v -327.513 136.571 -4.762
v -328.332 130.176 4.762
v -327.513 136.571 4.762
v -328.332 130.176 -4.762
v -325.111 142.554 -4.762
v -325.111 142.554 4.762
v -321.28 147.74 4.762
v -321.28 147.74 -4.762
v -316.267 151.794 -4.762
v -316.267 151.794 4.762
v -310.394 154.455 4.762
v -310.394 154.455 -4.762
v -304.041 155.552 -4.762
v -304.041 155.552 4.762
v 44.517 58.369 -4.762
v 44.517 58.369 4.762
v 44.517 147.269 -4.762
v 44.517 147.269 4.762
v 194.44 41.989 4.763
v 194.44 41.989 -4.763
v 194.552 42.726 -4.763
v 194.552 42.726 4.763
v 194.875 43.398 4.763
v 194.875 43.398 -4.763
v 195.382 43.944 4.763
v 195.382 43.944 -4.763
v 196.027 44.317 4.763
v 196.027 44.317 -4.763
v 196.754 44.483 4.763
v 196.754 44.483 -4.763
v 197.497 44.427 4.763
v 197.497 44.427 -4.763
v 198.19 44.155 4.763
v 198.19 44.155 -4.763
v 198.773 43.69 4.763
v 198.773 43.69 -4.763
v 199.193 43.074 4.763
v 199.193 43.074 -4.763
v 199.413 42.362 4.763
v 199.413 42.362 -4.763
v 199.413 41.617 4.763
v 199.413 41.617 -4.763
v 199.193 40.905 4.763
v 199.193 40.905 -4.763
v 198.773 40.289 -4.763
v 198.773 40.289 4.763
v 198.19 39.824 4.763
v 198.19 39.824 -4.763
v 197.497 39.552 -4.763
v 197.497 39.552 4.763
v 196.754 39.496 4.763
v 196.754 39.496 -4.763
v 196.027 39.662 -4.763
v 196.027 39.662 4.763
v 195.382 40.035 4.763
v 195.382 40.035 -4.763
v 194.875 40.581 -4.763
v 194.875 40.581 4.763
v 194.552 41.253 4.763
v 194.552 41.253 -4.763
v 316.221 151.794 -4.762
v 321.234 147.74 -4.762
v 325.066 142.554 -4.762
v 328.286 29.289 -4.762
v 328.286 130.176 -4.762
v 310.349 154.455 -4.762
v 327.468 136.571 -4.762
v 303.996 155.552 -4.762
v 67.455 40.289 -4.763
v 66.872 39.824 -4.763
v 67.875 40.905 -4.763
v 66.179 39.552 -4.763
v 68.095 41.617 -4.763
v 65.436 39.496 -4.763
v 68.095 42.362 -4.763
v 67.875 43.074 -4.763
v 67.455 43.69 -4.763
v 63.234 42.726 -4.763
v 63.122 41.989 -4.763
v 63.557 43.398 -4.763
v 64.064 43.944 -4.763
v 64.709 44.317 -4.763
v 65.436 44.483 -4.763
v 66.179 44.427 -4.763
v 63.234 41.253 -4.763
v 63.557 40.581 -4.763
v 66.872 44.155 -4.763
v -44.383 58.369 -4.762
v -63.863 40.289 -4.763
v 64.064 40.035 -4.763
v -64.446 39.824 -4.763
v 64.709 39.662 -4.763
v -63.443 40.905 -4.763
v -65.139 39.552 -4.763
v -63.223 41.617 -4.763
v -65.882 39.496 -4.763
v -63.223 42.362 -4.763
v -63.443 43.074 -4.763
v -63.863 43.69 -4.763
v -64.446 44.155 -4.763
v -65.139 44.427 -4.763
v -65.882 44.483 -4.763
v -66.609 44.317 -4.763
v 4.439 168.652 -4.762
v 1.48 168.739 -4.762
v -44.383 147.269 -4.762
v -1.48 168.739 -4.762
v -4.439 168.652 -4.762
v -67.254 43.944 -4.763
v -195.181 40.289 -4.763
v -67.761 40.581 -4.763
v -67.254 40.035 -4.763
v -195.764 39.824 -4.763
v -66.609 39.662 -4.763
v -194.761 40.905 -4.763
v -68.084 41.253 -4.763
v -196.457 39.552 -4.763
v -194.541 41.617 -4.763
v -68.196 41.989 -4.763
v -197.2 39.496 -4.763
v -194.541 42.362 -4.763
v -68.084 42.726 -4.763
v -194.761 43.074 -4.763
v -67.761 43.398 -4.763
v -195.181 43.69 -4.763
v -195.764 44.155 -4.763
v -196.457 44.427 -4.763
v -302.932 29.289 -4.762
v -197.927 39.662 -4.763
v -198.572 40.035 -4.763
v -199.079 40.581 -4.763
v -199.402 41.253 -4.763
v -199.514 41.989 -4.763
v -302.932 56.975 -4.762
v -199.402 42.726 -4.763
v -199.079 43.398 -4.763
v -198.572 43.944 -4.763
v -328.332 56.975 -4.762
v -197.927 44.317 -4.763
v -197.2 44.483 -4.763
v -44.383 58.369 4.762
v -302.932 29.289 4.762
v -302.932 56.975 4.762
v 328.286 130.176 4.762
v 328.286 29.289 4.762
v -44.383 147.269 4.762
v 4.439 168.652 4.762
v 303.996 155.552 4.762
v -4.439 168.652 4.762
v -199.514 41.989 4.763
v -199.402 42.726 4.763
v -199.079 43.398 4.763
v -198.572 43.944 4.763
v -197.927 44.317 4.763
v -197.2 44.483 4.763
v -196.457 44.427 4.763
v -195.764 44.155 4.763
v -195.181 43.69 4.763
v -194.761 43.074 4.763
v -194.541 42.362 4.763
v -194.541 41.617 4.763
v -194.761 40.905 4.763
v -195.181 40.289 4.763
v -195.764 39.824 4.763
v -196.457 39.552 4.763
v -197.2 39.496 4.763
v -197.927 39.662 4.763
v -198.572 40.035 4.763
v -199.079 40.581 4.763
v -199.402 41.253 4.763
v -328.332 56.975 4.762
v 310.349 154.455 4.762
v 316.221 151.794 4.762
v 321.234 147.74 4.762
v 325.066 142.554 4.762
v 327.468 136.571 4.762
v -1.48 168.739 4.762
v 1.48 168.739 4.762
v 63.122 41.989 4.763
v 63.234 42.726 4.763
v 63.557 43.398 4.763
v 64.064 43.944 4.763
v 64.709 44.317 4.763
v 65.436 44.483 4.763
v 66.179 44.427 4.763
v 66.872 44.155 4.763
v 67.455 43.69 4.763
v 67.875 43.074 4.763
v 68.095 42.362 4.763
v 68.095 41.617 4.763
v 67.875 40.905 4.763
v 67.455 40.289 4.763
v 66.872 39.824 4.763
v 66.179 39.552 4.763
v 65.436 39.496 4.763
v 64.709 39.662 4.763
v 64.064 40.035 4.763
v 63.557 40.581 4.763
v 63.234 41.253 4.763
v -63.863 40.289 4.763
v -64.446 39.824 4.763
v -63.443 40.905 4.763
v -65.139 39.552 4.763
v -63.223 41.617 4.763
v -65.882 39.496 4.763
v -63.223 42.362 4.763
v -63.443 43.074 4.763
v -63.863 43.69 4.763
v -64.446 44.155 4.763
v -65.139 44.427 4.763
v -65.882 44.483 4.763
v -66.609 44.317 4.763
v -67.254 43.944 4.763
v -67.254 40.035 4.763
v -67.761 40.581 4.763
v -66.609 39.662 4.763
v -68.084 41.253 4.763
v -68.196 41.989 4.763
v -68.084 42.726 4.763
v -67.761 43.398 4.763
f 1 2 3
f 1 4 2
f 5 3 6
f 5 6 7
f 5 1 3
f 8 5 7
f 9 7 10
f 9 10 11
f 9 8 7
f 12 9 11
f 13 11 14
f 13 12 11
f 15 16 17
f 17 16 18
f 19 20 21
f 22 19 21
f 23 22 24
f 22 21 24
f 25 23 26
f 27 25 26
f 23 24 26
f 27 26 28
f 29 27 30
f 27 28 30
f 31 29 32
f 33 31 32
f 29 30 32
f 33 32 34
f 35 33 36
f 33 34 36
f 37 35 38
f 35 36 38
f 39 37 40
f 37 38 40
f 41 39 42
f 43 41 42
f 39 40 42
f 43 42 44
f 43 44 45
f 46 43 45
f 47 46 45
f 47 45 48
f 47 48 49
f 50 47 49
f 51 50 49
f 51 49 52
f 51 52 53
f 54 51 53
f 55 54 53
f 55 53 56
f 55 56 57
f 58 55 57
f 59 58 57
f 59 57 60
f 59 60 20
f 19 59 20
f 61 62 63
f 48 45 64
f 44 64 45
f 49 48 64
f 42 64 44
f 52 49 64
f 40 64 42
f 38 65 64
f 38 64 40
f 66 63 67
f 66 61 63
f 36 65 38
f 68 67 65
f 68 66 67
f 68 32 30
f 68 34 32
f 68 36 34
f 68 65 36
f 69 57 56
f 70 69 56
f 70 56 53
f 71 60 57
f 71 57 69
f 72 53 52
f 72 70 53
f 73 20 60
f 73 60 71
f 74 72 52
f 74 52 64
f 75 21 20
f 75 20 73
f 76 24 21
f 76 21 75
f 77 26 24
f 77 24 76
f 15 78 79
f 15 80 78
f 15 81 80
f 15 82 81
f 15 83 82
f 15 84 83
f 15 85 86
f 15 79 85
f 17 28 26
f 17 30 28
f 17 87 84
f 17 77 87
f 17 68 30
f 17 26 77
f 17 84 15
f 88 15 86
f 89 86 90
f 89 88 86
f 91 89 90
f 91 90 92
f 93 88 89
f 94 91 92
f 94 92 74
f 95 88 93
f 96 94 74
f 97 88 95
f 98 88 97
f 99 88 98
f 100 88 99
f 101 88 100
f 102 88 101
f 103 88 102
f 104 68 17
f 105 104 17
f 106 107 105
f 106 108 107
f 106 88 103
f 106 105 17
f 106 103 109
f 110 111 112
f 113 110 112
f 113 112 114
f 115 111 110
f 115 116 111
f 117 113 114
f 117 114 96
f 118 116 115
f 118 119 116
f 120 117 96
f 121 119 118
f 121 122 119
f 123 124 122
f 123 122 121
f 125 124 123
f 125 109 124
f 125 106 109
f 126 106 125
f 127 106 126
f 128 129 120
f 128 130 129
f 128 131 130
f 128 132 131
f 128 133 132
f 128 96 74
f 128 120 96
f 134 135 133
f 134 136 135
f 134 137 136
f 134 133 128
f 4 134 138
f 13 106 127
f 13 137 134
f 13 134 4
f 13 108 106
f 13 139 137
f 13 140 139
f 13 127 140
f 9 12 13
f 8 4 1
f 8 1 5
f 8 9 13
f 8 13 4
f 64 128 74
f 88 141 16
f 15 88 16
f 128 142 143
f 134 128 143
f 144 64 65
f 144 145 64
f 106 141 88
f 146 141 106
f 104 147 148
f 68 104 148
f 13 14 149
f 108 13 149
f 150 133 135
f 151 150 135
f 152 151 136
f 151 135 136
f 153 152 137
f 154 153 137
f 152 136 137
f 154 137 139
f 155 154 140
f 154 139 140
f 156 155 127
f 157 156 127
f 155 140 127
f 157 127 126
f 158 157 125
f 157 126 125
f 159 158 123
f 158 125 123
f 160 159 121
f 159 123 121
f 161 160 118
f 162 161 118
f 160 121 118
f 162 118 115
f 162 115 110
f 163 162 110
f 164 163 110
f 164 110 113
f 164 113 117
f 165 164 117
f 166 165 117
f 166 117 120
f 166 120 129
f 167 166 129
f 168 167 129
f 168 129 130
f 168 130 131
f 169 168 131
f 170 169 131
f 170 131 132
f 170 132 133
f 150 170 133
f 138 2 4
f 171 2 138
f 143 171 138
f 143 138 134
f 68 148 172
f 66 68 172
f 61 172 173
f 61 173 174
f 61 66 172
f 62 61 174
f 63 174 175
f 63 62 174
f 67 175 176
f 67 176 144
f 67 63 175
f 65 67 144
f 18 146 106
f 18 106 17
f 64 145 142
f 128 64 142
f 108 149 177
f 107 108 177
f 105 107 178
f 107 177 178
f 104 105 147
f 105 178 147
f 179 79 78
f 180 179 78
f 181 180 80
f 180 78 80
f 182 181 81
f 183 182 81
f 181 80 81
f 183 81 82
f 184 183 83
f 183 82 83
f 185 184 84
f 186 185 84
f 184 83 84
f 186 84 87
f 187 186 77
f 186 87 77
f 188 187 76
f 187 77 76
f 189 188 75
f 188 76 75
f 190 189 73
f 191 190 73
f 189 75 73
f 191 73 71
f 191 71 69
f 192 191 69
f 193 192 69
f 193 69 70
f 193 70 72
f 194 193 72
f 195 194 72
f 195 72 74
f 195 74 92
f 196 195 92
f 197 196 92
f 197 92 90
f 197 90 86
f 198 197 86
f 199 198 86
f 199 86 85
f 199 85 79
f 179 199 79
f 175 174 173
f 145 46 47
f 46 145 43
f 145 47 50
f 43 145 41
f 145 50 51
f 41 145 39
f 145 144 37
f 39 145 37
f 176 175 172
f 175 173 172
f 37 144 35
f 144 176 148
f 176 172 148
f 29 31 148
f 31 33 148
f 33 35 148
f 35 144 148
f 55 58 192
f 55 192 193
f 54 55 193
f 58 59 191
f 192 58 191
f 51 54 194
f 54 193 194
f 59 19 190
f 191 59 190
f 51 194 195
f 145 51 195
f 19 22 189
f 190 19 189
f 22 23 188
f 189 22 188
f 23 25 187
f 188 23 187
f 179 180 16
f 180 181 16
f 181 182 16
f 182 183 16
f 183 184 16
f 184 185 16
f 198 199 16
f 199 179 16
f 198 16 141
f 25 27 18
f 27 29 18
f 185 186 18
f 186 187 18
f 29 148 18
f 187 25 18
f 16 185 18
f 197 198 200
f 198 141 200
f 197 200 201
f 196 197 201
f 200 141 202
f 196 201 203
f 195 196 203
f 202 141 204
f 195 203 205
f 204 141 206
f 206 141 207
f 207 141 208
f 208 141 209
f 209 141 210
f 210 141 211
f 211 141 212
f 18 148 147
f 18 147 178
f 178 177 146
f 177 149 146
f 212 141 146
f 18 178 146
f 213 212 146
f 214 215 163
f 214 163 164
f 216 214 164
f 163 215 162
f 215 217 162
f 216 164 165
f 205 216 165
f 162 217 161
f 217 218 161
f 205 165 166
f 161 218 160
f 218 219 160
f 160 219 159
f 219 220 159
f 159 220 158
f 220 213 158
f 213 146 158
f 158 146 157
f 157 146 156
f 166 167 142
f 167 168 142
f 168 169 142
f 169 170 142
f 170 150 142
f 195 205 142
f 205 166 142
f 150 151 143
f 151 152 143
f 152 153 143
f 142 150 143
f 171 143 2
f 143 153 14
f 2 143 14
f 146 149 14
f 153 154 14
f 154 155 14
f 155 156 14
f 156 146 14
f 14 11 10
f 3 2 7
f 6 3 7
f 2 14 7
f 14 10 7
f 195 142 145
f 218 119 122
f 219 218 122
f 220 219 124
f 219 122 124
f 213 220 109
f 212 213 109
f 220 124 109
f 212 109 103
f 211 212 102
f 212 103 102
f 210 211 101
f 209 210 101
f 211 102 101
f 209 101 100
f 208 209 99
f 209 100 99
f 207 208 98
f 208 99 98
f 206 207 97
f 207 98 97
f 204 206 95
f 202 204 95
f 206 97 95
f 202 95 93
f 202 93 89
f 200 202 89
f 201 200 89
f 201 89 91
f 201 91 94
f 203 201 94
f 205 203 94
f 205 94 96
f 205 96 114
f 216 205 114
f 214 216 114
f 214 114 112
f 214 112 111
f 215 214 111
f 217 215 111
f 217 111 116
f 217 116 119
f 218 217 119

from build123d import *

# Parameters (mm, degrees)
BOSS_EXTRUDE1_DEPTH         = 4.7625
FILLET1_R                   = 25.4
FILLET2_R                   = 101.6
SKETCH3_W                   = 25.4
SKETCH3_H                   = 27.686
CUT_EXTRUDE1_DEPTH          = 370.281286979
SKETCH5_W                   = 88.9
SKETCH5_H                   = 88.9
CUT_EXTRUDE2_DEPTH          = 370.281286979
TAP_DRILL_FOR_M6X1_0_TAP1_D = 5


with BuildPart() as part:
    # Sketch2 → Boss-Extrude1 (new, symmetric)
    with BuildSketch(Plane.XY):
        Polygon((-328.331514278, 55.6895), (-328.331514278, 154.489500012), (0, 168.8465), (328.285794278, 154.489500012), (328.285794278, 55.6895), (328.285794278, 29.289499968), (-328.331514278, 29.289499968), align=None)
    extrude(amount=BOSS_EXTRUDE1_DEPTH, both=True)

    # Fillet1
    fillet1_edges = [part.edges().sort_by_distance(p)[0] for p in [
        (-328.331514278, 154.489500012, 0),
        (328.285794278, 154.489500012, 0),
    ]]
    fillet(fillet1_edges, radius=FILLET1_R)

    # Fillet2
    # the kernel refuses this fillet: 101.6 mm, written as the material it takes off along each edge
    with BuildSketch(Plane(origin=(0, 168.8465, 15.869968436), x_dir=(-0.9990453371749675, -0.04368540109642698, 0), z_dir=(0, 0, -1))) as fillet2_piece_1:
        with BuildLine():
            CenterArc((FILLET2_R * 0.0437301906922, -FILLET2_R), FILLET2_R, 90, 5.00792009)
            Line((-FILLET2_R * 0.0435632568505, -FILLET2_R * 0.00381735910722), (0, 0))
            Line((0, 0), (FILLET2_R * 0.0437301906922, 0))
        make_face()
    extrude(amount=31.739936872, mode=Mode.SUBTRACT)

    # Sketch3 → Cut-Extrude1 (cut, through all)
    with BuildSketch(Plane.XY.offset(4.7625)):
        with Locations((-315.631514278, 43.132499968)):
            Rectangle(SKETCH3_W, SKETCH3_H)
    extrude(amount=-CUT_EXTRUDE1_DEPTH, mode=Mode.SUBTRACT)

    # Sketch5 → Cut-Extrude2 (cut, through all)
    with BuildSketch(Plane.XY.offset(4.7625)):
        with Locations((0.067349574, 102.81865045)):
            Rectangle(SKETCH5_W, SKETCH5_H)
    extrude(amount=-CUT_EXTRUDE2_DEPTH, mode=Mode.SUBTRACT)

    # Tap Drill for M6x1.0 Tap1 (through all)
    with Locations(Plane.XY.offset(4.7625)):
        with Locations((-197.013514278, 41.989499968), (-65.695514278, 41.989499968), (65.622485722, 41.989499968), (196.940485722, 41.989499968)):
            Hole(TAP_DRILL_FOR_M6X1_0_TAP1_D / 2)


solid = part.part
